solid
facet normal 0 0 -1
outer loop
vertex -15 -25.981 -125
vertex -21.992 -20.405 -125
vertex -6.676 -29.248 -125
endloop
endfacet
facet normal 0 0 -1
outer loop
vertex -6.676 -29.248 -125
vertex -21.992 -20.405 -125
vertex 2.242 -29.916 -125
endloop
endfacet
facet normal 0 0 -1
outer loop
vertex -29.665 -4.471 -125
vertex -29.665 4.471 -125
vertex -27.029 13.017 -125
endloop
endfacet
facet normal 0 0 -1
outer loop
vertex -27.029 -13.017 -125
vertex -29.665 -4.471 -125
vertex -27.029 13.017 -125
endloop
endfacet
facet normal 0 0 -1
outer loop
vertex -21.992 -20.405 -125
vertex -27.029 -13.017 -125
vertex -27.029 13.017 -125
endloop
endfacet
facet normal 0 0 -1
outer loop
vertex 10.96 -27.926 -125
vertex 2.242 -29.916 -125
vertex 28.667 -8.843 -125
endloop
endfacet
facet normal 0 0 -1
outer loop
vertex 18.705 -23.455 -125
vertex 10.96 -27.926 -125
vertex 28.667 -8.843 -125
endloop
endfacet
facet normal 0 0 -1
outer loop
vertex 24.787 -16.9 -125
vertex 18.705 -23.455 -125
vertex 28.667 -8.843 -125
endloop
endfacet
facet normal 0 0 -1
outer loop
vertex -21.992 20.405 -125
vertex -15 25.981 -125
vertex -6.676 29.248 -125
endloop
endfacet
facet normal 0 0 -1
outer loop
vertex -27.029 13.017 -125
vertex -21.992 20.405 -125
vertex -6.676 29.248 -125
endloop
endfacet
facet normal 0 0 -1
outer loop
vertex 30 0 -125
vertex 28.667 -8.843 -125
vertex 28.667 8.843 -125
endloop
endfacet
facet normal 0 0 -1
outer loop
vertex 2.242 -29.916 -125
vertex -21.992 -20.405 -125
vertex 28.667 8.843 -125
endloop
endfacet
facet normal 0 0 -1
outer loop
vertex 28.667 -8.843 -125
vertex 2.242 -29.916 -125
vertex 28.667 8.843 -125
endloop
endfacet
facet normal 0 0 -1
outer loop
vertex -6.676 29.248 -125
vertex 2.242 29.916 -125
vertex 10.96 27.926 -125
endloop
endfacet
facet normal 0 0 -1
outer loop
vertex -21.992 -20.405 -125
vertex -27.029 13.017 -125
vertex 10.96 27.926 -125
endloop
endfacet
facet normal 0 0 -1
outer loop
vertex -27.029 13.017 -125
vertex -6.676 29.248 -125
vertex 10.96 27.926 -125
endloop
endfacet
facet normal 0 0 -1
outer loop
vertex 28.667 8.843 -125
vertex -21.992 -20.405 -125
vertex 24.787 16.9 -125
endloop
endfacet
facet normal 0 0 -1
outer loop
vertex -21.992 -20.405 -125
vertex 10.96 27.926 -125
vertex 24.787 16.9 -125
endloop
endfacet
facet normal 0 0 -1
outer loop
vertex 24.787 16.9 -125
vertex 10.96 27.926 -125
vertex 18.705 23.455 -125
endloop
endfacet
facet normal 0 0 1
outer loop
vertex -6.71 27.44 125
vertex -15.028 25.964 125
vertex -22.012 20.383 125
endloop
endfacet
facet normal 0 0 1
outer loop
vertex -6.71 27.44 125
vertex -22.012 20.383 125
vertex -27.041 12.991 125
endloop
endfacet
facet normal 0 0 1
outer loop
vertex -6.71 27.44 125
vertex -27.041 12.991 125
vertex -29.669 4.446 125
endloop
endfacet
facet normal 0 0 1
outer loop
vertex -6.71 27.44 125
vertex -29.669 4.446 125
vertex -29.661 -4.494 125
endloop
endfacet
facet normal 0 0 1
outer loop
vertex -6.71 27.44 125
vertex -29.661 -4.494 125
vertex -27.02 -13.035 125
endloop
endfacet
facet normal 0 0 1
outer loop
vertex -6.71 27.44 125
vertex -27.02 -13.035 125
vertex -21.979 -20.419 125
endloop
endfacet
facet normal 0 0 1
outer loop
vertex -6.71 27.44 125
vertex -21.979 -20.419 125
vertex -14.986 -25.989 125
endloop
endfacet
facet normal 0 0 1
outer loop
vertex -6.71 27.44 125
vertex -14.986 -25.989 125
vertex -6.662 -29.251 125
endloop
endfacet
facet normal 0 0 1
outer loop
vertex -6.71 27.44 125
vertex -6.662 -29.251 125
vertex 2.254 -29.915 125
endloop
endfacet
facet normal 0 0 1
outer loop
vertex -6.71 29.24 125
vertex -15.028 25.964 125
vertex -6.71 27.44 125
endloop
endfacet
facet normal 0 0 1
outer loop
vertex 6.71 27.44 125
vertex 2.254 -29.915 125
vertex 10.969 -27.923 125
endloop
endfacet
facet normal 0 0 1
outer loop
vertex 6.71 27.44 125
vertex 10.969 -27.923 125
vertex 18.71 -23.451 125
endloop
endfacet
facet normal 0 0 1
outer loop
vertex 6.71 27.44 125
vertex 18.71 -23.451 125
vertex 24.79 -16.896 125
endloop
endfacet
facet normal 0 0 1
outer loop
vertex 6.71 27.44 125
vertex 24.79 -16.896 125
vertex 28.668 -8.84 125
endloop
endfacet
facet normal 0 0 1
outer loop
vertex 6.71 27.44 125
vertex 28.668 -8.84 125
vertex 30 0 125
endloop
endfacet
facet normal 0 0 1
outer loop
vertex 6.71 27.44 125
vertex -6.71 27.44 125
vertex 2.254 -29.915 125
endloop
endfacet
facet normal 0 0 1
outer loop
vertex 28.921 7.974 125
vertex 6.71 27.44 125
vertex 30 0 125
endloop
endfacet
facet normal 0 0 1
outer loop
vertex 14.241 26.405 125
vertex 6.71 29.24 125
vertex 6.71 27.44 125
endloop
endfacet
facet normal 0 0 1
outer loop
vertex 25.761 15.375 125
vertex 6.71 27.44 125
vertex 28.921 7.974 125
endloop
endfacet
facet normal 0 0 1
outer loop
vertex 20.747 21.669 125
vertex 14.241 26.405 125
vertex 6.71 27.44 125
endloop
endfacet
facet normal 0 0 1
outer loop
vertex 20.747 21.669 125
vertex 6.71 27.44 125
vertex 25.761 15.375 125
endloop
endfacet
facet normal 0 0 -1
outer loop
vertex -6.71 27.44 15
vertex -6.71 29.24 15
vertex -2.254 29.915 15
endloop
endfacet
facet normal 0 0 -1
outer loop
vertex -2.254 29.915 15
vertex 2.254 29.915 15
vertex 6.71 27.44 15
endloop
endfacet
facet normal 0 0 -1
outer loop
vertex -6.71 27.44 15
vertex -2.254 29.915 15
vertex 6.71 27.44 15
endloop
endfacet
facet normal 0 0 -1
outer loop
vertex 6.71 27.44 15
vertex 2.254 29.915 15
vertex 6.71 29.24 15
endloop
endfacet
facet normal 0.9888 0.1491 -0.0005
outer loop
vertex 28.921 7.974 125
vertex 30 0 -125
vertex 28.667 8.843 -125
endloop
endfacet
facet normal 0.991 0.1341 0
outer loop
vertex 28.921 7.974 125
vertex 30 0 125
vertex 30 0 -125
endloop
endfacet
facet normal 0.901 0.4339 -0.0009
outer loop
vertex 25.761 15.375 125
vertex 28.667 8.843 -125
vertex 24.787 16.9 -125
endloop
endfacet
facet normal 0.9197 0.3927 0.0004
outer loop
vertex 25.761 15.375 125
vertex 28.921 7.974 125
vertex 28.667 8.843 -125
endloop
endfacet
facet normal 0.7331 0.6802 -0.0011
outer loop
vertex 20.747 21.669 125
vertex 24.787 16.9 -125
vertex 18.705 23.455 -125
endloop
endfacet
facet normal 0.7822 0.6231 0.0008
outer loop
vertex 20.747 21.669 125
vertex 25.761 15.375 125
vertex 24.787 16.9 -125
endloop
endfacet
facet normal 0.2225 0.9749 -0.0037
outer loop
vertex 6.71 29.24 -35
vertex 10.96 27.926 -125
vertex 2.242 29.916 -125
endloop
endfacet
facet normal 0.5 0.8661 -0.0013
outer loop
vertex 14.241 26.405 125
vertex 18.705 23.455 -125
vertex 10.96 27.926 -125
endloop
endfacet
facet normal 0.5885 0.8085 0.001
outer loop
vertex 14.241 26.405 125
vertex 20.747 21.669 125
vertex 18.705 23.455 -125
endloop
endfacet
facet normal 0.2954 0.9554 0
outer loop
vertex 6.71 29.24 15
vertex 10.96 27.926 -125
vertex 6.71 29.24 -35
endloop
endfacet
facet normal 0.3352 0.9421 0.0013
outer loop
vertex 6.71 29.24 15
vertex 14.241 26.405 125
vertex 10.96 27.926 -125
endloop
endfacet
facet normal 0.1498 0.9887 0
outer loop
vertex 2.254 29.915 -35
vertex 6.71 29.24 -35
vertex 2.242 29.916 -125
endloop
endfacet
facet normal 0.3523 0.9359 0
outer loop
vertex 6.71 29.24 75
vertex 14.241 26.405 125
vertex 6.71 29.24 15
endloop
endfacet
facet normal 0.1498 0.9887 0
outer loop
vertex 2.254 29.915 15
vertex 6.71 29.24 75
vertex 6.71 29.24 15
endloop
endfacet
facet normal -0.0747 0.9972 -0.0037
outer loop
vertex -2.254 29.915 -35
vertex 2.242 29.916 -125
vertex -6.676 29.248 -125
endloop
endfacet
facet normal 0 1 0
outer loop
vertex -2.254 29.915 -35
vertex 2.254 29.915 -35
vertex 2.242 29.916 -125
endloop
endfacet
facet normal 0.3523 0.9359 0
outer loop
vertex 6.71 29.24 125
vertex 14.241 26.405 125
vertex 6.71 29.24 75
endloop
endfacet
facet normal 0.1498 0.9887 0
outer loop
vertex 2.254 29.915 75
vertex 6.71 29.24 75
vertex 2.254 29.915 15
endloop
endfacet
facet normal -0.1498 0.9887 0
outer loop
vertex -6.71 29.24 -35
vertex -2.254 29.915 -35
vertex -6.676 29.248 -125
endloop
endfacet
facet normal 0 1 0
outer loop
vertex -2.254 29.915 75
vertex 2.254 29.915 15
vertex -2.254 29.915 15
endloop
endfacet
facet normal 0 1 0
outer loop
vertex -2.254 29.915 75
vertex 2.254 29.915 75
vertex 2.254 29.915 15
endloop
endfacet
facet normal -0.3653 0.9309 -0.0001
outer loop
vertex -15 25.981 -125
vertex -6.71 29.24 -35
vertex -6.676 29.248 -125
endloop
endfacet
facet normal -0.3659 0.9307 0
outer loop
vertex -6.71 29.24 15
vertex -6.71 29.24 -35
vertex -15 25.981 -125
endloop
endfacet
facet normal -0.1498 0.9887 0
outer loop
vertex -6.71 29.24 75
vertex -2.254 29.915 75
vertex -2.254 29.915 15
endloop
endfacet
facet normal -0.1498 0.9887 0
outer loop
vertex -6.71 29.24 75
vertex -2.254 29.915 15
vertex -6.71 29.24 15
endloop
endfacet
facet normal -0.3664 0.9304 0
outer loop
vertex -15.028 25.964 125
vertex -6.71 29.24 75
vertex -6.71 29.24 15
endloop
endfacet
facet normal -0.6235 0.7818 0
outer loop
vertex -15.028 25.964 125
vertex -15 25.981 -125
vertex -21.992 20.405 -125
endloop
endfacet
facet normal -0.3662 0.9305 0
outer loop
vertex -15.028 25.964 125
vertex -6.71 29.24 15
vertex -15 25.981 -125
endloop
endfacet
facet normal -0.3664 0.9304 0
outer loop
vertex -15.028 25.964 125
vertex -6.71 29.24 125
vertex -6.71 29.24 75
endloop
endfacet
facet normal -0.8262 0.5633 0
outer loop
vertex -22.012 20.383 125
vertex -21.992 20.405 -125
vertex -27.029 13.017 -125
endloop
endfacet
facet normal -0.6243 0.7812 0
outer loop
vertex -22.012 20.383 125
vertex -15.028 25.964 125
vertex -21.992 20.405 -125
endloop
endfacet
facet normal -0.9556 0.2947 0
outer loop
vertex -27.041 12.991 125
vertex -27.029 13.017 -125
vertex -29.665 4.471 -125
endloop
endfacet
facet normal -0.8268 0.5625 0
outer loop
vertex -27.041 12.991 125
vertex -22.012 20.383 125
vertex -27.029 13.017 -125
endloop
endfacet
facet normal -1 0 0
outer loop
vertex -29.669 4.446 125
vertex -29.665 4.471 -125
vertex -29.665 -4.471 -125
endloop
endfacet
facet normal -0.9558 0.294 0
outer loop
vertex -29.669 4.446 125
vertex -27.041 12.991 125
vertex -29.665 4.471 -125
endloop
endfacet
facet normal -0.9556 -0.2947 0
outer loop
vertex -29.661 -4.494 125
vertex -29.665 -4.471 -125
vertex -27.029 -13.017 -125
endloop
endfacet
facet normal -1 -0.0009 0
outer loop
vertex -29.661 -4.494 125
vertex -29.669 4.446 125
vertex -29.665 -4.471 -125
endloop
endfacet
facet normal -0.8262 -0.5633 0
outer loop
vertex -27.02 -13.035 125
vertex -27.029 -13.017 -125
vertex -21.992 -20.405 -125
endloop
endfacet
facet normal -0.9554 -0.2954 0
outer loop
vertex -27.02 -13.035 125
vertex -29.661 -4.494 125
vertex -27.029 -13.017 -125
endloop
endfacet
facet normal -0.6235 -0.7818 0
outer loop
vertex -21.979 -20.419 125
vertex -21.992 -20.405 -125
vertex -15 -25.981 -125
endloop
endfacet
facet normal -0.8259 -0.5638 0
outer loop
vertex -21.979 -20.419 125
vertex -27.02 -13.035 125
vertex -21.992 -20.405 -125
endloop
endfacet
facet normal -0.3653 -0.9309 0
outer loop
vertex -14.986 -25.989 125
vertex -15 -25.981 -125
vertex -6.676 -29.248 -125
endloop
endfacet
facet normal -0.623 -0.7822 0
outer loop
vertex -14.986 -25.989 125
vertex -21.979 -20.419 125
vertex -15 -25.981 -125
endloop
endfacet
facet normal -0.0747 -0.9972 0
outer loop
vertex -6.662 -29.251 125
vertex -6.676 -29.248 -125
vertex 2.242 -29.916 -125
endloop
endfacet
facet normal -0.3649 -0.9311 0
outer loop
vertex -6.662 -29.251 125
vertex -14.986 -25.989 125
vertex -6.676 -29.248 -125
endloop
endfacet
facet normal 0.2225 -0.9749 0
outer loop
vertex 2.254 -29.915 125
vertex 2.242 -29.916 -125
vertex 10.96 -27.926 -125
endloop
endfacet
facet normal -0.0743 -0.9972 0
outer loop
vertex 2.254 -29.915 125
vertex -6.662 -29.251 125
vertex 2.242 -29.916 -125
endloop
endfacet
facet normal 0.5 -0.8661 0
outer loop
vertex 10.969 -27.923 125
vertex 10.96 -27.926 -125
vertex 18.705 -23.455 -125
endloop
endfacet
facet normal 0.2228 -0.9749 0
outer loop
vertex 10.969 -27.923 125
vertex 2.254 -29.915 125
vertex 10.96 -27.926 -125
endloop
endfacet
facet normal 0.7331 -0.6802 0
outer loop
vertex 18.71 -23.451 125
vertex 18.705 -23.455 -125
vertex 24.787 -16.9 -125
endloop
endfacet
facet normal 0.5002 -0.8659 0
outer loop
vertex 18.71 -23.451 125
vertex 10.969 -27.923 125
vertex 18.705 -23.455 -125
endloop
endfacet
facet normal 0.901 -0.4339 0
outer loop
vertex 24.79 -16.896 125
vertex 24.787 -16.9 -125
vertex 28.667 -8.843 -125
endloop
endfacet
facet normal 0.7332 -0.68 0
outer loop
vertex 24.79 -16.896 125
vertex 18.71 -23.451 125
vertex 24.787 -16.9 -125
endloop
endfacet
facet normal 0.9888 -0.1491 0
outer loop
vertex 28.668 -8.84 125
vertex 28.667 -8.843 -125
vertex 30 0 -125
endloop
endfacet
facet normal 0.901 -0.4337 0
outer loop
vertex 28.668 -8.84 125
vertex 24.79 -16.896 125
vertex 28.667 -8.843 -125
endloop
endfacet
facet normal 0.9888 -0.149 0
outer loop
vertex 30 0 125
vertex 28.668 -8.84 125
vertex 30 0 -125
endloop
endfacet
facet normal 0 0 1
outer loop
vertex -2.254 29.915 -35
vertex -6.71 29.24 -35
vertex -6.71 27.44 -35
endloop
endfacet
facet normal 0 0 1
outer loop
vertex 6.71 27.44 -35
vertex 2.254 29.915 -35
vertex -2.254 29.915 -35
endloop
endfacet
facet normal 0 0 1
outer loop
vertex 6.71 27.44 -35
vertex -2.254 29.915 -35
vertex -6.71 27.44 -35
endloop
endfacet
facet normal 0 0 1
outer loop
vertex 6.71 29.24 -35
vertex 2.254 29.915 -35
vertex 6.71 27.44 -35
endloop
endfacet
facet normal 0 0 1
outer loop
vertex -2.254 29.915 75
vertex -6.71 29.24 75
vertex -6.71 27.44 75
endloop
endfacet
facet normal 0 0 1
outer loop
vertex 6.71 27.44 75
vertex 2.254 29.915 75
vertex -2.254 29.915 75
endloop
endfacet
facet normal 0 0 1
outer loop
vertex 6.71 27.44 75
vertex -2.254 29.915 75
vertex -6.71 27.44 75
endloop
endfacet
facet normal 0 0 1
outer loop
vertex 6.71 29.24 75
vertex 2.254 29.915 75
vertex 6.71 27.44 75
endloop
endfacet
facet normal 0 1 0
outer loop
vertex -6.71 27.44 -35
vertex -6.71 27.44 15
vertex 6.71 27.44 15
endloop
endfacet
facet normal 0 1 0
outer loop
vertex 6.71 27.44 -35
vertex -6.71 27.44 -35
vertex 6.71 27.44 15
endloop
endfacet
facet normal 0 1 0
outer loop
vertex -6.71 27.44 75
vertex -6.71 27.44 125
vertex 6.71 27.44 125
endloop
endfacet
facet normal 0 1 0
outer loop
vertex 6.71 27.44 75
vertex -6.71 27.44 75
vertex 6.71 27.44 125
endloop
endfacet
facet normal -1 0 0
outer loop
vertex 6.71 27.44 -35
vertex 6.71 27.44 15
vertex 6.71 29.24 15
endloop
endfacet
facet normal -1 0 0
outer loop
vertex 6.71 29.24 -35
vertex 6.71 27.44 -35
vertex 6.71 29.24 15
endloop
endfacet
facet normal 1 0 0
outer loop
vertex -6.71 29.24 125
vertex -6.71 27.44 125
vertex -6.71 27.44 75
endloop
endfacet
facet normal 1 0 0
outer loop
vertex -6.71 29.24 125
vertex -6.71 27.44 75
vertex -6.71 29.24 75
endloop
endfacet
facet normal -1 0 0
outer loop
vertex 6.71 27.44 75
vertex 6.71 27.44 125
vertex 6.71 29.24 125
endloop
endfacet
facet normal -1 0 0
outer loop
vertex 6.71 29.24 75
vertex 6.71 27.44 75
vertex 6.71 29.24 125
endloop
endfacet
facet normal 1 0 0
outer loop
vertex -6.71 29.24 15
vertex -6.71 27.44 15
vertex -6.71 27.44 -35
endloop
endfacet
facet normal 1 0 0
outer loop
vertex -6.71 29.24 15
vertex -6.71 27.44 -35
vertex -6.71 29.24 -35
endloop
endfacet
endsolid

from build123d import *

# Parameters (mm, degrees)
SKETCH1_R           = 30
BOSS_EXTRUDE1_DEPTH = 125
SKETCH2_W           = 13.419524584
SKETCH2_H           = 7
CUT_EXTRUDE1_DEPTH  = 50
SKETCH3_W           = 13.419524584
SKETCH3_H           = 7
CUT_EXTRUDE2_DEPTH  = 50


with BuildPart() as part:
    # Sketch1 → Boss-Extrude1 (new, symmetric)
    with BuildSketch(Plane.XY):
        Circle(SKETCH1_R)
    extrude(amount=BOSS_EXTRUDE1_DEPTH, both=True)

    # Sketch2 → Cut-Extrude1 (cut)
    with BuildSketch(Plane.XY.offset(125)):
        with Locations((0, 30.94)):
            Rectangle(SKETCH2_W, SKETCH2_H)
    extrude(amount=-CUT_EXTRUDE1_DEPTH, mode=Mode.SUBTRACT)

    # Sketch3 → Cut-Extrude2 (cut)
    with BuildSketch(Plane.XY.offset(15)):
        with Locations((0, 30.94)):
            Rectangle(SKETCH3_W, SKETCH3_H)
    extrude(amount=-CUT_EXTRUDE2_DEPTH, mode=Mode.SUBTRACT)


solid = part.part
